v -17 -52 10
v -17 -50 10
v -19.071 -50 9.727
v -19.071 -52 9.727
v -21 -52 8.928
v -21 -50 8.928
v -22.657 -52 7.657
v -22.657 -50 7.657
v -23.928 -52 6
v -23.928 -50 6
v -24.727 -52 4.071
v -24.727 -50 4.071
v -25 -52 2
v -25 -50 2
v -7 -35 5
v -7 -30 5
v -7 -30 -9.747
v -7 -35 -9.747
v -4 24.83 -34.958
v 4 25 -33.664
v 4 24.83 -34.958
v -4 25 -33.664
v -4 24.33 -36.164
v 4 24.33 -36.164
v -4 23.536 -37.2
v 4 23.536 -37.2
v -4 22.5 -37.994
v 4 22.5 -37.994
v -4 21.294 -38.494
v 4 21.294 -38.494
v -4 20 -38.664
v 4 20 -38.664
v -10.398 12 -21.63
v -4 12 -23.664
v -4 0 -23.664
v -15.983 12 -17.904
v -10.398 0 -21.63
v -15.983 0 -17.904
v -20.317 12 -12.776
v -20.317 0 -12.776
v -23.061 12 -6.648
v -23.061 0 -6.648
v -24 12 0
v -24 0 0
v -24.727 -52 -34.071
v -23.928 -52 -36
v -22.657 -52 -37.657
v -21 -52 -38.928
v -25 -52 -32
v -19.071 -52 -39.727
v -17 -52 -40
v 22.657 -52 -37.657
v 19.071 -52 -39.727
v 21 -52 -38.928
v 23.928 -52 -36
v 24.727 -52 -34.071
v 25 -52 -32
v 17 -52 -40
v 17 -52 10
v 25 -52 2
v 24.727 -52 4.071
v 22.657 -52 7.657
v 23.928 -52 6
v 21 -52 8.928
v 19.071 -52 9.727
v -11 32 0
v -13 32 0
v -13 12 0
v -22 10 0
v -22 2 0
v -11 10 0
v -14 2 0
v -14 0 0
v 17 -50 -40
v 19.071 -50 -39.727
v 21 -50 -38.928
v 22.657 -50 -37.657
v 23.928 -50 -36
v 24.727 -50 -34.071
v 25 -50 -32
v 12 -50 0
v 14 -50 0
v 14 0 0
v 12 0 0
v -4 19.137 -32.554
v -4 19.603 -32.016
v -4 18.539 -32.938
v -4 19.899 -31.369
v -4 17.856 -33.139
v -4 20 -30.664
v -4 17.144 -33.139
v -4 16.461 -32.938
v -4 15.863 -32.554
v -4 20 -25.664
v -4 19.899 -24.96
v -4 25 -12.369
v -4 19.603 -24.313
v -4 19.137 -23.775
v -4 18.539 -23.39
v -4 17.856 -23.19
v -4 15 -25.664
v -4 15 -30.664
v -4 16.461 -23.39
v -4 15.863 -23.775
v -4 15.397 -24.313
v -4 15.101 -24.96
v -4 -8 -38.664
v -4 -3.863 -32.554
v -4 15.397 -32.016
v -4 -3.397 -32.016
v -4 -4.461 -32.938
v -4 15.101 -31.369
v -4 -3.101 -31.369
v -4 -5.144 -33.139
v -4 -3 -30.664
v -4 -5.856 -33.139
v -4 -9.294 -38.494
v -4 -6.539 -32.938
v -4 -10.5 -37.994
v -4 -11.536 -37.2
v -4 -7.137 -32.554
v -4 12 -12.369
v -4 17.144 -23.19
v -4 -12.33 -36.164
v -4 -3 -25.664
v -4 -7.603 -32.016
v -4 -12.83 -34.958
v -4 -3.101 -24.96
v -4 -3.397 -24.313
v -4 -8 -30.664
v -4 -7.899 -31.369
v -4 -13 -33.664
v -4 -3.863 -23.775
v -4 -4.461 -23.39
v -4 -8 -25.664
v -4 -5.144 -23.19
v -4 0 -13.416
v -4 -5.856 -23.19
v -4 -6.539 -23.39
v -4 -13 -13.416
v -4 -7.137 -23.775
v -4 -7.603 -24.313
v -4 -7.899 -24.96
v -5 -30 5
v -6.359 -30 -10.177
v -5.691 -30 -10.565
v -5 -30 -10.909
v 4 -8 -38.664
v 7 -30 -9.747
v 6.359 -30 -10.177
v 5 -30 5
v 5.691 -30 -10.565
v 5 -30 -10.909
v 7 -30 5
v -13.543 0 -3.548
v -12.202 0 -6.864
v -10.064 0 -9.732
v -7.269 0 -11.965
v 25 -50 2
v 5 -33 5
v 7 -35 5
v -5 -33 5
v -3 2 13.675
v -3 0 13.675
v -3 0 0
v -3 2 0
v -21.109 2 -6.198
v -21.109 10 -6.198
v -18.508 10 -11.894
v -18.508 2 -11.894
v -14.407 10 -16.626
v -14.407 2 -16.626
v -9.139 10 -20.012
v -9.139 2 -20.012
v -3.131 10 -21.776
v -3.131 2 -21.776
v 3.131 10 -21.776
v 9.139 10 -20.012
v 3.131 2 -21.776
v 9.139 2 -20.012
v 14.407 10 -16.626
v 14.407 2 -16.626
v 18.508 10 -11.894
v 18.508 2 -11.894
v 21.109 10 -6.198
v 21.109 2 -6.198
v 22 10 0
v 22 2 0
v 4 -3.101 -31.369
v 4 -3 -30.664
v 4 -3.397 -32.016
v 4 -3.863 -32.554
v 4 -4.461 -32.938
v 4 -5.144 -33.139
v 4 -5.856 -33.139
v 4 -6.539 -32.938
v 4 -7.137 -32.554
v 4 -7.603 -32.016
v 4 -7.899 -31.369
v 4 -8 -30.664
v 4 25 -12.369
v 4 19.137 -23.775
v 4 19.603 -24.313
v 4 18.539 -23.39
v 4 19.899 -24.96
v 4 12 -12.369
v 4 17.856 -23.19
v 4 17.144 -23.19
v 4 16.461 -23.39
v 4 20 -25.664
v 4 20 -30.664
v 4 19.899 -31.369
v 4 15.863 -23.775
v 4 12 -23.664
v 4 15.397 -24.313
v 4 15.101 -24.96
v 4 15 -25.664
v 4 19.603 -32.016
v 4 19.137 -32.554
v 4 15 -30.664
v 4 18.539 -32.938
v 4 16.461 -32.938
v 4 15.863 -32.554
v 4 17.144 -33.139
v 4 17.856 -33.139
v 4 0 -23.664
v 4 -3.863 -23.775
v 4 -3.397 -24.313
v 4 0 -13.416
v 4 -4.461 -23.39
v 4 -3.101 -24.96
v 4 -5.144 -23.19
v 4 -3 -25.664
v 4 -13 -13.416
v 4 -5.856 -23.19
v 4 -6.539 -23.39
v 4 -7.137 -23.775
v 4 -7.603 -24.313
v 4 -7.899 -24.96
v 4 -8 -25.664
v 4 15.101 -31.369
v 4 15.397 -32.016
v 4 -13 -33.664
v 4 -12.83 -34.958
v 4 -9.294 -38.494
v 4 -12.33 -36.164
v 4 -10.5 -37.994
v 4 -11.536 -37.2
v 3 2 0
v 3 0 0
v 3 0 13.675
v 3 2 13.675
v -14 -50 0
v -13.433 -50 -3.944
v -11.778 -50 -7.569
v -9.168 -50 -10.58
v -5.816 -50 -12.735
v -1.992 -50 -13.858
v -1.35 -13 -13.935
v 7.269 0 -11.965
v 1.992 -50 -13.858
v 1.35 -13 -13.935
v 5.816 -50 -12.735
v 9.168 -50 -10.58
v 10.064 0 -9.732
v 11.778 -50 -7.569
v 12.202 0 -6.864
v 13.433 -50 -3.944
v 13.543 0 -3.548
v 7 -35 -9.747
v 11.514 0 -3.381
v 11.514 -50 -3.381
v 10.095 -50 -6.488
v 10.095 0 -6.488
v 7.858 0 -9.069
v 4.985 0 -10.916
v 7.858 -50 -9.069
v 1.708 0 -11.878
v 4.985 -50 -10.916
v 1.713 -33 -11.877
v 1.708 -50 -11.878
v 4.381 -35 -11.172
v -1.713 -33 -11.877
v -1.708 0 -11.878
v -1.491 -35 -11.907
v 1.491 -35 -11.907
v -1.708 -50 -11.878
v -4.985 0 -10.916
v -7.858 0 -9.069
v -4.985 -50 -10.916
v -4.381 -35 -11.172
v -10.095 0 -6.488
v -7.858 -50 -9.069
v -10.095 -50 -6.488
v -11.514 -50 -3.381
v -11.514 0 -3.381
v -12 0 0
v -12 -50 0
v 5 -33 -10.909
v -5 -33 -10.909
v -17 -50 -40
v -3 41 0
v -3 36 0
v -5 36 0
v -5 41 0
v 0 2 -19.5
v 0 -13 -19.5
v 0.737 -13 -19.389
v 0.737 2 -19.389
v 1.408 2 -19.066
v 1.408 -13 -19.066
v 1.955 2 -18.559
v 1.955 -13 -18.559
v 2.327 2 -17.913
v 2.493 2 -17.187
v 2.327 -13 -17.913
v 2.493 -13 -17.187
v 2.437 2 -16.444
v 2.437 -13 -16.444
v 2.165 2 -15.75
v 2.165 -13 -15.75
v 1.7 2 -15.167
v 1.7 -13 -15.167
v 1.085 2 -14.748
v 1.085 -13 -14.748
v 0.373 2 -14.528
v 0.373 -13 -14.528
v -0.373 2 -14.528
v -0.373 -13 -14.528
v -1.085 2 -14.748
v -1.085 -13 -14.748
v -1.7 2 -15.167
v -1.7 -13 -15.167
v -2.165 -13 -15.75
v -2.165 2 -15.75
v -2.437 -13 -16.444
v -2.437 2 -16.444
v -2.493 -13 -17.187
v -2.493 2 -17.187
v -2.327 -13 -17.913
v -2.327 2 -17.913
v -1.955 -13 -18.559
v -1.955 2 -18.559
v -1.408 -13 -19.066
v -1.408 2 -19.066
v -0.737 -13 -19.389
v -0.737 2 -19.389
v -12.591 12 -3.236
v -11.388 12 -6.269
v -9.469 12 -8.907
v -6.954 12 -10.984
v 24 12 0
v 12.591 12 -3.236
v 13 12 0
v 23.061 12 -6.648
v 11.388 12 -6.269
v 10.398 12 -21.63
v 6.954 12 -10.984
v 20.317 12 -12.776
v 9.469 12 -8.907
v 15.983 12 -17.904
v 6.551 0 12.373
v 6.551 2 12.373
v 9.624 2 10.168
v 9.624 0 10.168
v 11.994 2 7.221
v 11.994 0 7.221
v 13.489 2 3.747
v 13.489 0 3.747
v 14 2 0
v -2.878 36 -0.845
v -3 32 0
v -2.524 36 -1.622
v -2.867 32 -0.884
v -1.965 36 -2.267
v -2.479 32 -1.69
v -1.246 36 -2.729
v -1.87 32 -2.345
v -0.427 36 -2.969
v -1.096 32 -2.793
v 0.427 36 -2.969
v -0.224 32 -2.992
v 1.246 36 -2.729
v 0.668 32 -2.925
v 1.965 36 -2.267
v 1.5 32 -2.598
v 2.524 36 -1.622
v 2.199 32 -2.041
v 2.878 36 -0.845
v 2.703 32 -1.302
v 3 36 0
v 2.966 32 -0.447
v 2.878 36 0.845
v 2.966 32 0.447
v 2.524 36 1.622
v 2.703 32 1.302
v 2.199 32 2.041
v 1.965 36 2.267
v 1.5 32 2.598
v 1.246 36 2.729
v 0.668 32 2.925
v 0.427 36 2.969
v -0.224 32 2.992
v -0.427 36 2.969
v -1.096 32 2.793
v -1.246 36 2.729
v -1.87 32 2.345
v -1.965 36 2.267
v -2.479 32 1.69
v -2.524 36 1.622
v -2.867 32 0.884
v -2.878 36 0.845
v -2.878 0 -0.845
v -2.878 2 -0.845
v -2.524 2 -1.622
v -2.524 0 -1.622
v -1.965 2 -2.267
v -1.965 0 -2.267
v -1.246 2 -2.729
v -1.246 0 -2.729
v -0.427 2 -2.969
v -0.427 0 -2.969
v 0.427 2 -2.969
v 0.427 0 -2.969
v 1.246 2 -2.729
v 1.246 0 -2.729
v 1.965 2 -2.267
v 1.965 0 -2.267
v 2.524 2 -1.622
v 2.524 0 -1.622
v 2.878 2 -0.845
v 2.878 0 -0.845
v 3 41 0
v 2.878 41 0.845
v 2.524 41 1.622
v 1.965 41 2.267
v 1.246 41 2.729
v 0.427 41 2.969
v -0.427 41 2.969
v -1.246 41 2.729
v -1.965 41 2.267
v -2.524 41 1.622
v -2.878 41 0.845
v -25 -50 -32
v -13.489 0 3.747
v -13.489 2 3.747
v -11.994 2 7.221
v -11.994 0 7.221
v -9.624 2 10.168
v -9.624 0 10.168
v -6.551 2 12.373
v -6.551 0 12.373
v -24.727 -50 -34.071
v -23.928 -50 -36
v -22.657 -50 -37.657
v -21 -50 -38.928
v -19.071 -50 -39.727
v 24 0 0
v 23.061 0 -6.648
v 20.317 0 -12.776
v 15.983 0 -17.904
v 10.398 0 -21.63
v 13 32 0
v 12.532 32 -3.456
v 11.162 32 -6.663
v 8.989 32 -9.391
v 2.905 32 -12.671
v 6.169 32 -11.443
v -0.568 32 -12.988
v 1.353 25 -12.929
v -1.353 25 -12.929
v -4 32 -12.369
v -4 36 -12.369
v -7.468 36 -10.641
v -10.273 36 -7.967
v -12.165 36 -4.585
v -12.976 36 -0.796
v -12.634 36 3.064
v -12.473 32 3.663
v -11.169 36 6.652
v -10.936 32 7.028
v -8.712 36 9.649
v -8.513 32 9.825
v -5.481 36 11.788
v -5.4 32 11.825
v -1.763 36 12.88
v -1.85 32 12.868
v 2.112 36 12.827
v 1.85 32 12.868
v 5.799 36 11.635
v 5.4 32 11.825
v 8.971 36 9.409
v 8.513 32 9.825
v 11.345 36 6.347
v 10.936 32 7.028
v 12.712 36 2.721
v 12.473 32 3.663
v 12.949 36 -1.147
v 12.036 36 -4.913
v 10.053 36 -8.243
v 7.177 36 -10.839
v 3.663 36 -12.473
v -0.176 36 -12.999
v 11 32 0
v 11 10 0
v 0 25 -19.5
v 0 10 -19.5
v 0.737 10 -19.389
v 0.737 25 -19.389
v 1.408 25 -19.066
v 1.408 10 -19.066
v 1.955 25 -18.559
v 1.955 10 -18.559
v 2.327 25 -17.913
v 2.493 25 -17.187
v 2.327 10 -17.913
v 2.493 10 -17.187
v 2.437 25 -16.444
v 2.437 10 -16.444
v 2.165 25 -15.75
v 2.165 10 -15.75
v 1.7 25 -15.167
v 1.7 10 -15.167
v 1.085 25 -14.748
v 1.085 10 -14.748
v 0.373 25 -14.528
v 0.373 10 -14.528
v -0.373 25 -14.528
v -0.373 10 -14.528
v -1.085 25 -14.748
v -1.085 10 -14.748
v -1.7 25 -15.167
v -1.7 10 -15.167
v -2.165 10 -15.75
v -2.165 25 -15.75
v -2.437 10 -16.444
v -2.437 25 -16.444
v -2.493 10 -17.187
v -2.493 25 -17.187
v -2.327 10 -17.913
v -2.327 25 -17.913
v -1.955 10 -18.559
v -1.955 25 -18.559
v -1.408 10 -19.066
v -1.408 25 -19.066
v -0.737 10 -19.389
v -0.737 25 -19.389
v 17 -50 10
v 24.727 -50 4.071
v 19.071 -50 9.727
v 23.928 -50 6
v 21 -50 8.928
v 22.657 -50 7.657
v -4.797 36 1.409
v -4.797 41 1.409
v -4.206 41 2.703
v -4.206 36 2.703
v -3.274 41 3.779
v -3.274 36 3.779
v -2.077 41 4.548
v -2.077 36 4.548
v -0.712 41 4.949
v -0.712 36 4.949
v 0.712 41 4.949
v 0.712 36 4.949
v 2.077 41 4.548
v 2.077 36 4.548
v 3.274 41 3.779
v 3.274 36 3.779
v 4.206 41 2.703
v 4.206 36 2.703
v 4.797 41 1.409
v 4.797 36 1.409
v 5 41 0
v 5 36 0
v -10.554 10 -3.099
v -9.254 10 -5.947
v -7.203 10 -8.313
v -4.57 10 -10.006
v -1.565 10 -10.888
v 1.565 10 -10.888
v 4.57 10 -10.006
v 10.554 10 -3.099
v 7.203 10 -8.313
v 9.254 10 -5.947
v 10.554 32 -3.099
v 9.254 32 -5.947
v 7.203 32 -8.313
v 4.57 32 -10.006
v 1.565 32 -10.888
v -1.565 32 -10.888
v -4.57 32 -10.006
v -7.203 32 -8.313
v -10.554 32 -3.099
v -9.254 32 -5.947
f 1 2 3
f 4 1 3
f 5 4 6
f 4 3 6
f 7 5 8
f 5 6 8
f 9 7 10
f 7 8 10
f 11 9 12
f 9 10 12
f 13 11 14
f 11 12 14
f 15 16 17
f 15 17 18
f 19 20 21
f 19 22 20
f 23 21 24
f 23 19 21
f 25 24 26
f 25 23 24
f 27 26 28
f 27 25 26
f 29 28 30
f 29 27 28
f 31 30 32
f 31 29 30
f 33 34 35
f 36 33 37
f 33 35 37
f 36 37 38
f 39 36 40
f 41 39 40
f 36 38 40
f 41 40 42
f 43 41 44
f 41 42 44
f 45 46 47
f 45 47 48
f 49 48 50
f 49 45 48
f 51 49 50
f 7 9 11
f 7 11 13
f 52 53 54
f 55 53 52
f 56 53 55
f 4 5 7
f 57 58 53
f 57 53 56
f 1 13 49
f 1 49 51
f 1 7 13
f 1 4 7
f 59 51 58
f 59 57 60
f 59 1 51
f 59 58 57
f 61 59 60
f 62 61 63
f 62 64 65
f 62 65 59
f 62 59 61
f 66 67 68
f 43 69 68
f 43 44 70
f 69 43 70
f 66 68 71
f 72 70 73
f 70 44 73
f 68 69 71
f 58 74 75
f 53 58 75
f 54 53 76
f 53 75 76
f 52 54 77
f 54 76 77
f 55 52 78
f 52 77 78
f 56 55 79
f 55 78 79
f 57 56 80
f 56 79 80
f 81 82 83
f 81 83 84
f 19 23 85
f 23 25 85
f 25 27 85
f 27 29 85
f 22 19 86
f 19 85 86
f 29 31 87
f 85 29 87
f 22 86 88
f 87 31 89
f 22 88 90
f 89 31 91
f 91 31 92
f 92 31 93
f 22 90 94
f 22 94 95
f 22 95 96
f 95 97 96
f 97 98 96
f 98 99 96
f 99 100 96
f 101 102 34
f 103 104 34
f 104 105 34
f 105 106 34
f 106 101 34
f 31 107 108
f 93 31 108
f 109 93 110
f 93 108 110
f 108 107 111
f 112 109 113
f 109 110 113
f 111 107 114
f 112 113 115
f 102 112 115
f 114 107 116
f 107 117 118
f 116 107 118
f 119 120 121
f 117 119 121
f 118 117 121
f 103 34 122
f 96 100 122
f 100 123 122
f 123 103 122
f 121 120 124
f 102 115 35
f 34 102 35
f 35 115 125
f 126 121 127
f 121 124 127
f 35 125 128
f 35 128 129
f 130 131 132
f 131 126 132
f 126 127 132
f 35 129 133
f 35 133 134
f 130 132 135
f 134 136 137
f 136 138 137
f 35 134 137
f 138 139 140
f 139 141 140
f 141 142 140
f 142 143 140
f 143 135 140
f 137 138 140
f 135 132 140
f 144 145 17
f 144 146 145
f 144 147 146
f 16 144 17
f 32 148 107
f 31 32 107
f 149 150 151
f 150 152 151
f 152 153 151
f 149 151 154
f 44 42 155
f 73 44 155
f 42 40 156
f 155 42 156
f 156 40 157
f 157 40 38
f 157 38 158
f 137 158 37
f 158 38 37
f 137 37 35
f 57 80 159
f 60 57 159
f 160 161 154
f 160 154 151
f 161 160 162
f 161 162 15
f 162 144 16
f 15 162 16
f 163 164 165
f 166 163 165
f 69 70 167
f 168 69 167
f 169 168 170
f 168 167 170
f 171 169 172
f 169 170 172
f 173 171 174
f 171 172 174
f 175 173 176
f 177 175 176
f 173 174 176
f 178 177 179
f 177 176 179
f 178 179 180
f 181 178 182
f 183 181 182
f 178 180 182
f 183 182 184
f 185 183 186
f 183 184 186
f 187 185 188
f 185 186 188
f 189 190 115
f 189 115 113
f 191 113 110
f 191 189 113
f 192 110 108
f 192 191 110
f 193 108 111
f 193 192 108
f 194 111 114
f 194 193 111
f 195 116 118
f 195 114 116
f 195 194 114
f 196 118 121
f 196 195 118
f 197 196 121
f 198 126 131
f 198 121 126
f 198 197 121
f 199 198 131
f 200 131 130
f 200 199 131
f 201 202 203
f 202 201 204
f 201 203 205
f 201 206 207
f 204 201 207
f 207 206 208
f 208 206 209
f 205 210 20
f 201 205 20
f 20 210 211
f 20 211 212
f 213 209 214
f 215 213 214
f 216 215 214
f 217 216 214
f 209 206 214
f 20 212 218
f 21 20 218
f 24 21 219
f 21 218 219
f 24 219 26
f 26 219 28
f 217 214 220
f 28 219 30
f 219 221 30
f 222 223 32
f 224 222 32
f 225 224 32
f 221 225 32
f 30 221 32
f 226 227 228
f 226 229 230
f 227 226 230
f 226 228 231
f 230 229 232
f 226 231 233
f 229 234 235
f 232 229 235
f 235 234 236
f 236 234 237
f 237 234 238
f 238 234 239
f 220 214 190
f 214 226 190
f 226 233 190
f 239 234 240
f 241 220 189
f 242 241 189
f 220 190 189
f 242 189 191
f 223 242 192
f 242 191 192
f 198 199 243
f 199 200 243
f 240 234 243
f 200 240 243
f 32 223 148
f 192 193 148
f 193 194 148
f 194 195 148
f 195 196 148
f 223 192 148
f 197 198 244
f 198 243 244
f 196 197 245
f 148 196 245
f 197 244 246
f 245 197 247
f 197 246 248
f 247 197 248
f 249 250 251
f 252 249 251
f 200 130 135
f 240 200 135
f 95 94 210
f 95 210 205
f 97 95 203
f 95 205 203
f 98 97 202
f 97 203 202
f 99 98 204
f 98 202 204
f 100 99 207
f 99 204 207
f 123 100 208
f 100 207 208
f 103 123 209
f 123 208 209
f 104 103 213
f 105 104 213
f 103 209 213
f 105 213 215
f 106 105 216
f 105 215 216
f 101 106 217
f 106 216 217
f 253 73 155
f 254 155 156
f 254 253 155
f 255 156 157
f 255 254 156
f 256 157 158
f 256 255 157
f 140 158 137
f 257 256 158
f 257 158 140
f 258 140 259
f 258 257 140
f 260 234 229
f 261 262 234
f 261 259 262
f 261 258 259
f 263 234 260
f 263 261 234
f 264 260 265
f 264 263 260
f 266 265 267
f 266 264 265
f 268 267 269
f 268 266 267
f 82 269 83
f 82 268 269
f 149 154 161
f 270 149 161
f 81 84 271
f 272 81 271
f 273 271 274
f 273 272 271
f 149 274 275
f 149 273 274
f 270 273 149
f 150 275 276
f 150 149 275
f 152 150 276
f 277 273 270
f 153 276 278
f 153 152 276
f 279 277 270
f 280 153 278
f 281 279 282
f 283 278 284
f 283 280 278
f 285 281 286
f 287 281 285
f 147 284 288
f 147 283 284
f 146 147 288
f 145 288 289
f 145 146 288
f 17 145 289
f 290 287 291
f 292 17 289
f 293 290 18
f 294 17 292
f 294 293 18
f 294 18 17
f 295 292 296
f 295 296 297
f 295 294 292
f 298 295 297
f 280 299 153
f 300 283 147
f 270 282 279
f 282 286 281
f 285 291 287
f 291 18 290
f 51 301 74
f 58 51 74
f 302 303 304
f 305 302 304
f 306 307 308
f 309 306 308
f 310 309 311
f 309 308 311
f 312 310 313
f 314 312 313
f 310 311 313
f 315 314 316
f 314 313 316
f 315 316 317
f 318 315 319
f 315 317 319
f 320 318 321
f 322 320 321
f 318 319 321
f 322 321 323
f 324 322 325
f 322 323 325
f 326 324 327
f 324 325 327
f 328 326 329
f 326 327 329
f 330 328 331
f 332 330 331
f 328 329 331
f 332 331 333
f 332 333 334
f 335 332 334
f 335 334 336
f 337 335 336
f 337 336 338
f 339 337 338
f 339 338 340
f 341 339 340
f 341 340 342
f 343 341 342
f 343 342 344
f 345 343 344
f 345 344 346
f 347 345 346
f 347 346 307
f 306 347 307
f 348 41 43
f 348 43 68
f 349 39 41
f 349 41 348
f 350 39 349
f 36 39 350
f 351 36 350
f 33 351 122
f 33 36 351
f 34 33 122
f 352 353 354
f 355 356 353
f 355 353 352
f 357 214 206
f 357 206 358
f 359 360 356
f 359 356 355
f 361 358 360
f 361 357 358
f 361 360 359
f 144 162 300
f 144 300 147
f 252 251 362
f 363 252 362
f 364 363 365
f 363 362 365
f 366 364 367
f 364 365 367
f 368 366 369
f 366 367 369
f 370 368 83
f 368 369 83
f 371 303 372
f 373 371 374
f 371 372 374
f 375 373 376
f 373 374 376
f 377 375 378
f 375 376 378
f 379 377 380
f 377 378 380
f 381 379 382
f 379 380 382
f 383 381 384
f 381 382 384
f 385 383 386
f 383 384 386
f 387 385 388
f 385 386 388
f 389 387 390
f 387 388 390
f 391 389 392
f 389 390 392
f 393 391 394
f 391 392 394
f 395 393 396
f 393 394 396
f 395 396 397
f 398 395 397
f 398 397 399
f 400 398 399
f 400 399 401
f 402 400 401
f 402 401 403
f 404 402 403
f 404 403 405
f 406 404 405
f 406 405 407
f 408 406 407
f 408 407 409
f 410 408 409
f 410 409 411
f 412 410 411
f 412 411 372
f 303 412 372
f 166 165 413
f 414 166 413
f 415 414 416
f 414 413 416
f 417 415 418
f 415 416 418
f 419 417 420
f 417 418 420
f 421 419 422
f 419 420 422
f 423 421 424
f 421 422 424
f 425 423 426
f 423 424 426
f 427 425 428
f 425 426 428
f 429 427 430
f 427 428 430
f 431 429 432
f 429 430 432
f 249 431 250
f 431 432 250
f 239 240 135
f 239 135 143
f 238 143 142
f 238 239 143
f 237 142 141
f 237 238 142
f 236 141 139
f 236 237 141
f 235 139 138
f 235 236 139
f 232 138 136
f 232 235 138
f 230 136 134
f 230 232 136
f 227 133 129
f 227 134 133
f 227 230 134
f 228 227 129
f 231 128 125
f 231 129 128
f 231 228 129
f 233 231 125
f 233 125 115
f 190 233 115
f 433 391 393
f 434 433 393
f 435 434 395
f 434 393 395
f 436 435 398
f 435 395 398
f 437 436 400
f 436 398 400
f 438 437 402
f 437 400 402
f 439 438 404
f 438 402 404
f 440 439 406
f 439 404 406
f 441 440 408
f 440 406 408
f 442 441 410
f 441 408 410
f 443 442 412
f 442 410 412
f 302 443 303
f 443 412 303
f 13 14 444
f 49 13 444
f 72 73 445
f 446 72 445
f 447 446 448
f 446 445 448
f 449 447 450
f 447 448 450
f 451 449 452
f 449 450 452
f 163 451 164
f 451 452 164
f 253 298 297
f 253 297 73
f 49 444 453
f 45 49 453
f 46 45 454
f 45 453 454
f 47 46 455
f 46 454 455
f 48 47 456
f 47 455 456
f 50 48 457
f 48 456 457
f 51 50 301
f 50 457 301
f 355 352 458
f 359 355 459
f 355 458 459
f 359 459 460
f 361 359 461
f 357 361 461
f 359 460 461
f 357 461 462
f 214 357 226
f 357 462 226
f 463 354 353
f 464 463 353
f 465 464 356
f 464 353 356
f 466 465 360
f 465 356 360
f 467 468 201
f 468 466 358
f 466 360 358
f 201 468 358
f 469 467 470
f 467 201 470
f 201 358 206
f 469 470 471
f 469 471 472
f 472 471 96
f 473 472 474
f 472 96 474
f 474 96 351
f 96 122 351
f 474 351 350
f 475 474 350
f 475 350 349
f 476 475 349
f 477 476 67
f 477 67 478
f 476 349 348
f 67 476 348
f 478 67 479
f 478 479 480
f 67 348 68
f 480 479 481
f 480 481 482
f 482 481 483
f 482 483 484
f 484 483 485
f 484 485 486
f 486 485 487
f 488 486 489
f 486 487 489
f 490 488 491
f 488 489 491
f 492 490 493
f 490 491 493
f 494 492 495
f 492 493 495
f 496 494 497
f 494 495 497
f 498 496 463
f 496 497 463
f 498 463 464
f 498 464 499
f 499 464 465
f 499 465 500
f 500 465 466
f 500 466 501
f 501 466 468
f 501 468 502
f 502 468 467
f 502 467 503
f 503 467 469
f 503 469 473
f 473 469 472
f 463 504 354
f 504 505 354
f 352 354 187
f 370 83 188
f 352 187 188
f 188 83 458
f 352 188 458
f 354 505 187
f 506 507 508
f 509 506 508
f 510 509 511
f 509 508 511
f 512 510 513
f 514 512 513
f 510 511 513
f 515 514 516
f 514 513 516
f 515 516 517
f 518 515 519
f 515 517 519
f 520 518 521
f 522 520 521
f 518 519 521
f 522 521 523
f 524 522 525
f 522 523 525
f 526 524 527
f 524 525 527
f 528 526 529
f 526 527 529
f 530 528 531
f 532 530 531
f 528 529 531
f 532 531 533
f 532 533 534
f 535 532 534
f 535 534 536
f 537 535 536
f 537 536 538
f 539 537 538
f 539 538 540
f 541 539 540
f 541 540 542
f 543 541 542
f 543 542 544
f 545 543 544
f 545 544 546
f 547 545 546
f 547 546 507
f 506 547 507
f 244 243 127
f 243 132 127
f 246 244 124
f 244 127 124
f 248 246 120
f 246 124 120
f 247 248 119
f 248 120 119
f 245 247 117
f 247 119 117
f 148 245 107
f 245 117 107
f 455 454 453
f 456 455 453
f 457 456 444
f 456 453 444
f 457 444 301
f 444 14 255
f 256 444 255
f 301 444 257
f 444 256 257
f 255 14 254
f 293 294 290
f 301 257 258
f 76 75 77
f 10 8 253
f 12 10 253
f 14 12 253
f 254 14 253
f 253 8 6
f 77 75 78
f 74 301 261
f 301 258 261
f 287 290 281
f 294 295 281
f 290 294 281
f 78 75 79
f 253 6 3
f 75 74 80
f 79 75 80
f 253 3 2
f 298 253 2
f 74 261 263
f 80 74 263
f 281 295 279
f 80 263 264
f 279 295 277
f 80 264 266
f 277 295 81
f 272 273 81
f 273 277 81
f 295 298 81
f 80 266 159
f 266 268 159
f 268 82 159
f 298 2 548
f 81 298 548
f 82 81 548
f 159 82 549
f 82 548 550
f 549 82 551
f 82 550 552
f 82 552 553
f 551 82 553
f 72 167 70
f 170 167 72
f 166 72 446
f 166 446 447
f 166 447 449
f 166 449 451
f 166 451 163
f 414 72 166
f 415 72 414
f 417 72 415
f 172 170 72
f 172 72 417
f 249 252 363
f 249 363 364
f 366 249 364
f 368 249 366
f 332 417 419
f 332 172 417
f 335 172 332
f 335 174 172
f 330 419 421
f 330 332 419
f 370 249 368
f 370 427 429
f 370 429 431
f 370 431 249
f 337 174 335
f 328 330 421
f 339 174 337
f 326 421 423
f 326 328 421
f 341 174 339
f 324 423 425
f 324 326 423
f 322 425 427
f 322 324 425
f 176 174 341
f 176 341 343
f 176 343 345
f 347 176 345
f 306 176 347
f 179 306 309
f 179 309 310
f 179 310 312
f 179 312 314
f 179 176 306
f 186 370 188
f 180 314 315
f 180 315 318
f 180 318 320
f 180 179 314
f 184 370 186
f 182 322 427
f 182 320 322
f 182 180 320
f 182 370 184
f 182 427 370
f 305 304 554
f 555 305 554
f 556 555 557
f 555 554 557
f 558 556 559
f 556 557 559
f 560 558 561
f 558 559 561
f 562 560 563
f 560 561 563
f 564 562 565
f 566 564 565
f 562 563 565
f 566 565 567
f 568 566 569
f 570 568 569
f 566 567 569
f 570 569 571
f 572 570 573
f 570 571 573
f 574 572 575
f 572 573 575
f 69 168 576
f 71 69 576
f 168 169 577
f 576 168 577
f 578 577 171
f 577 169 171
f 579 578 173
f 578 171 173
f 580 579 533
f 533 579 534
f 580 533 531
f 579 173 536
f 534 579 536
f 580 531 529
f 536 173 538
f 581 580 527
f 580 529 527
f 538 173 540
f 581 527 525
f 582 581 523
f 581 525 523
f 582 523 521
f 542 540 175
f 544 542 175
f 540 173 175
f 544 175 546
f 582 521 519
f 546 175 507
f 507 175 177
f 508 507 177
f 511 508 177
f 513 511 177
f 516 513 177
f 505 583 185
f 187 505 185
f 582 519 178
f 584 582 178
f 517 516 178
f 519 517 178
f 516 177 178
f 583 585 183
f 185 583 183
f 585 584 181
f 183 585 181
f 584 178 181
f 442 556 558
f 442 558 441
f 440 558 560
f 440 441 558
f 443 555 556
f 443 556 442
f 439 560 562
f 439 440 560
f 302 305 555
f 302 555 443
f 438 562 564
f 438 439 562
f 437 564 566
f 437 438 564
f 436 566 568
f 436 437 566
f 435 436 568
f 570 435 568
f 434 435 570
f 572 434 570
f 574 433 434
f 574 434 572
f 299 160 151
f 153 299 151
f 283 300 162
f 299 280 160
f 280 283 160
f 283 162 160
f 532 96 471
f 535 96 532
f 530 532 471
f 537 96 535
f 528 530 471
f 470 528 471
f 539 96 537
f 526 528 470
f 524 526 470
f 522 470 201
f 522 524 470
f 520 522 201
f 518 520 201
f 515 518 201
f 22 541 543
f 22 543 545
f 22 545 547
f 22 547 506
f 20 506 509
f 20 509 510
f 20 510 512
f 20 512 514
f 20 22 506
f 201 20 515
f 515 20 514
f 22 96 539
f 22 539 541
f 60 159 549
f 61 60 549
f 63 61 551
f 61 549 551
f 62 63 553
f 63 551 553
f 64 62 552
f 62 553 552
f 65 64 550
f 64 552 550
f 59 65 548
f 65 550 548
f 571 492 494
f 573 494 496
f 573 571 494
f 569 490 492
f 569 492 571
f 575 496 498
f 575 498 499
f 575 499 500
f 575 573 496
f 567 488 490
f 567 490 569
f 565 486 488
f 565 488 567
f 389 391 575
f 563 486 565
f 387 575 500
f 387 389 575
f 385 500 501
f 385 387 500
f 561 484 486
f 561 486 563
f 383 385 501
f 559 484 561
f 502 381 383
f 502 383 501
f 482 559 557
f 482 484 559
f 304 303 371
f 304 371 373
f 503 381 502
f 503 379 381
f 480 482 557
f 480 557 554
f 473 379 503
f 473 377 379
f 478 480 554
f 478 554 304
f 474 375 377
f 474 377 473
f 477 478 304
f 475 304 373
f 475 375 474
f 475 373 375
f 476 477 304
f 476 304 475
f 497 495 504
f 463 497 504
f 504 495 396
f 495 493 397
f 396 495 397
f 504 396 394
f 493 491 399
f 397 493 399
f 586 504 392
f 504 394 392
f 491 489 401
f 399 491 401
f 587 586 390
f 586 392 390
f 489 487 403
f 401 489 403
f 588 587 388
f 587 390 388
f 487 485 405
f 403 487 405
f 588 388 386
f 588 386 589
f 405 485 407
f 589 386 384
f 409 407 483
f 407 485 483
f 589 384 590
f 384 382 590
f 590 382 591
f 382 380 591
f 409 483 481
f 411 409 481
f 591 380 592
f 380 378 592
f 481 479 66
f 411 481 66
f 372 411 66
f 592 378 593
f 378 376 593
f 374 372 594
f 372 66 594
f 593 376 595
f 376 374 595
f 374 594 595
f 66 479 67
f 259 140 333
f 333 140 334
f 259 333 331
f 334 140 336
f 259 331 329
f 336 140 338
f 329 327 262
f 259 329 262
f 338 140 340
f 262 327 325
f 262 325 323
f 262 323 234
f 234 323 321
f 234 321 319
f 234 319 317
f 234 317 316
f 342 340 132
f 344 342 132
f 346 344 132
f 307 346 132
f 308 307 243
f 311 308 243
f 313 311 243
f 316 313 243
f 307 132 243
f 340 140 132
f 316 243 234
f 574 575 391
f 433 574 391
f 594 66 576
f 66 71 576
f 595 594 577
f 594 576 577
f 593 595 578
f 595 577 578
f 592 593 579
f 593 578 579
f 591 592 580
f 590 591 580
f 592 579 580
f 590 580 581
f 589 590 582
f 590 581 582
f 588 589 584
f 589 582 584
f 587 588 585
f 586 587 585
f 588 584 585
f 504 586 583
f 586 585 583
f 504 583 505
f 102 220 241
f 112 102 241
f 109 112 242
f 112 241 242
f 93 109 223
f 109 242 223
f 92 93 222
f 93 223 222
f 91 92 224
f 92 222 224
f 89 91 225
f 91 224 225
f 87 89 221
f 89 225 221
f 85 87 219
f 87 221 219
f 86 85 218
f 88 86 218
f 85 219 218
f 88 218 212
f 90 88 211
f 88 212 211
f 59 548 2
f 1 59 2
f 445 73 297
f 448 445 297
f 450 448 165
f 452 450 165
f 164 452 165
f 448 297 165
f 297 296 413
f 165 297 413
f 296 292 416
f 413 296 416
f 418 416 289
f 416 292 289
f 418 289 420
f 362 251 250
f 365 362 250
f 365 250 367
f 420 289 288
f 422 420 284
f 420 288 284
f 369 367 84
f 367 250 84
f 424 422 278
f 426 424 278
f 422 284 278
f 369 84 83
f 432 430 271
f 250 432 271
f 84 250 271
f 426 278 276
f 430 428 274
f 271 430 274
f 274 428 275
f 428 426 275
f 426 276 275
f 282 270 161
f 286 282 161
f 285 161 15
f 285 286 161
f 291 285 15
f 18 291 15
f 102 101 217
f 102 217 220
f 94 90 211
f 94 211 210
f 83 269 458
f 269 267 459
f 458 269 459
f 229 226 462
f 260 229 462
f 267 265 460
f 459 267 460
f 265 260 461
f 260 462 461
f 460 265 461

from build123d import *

# Parameters (mm, degrees)
MOTOR_FRONTPLATE_DEPTH           = 2
MOTORKRYBBE_START                = 50
MOTORKRYBBE_DEPTH                = 50
SKYGGE_KAPPE_DEPTH               = 8
SKYGGE_TOPP_DEPTH                = 2
LEDHOLDER_TOPP_DEPTH             = 13
LEDHOLDER_START                  = 13
LEDHOLDER_BUNN_DEPTH             = 13
SKETCH10_R                       = 2.5
LEDHULL_DEPTH                    = 51.950956811
ROTORKAPPE_VEGG_DEPTH            = 20
SKETCH12_R                       = 13
LASERHOLDER_DEPTH                = 4
LASER_HULL_D                     = 6
BUNNPLATE_DEPTH                  = 2
BOSS_EXTRUDE12_DEPTH             = 5
BOSS_EXTRUDE12_DIRECTION_2_REACH = 72.207
LED_START                        = -38
LED_KABELHOLDER_DEPTH            = 38
KABELHOLDER_HULL_REACH           = 73.729
FILLET1_R                        = 5
BOSS_EXTRUDE14_DEPTH             = 5


with BuildPart() as part:
    # Sketch1 → Motor-frontplate (new body)
    with BuildSketch(Plane(origin=(0, 0, 0), x_dir=(1, 0, 0), z_dir=(0, 1, 0))):
        with BuildLine():
            ThreePointArc((-3, 0), (0, 3), (3, 0))
            Line((3, 0), (3, -13.674794331))
            ThreePointArc((3, -13.674794331), (10.908712115, -8.774964387), (14, 0))
            ThreePointArc((14, 0), (0, 14), (-14, 0))
            ThreePointArc((-14, 0), (-10.908712115, -8.774964387), (-3, -13.674794331))
            Line((-3, -13.674794331), (-3, 0))
        make_face()
        with BuildLine():
            Line((14, 0), (24, 0))
            ThreePointArc((24, 0), (0, 24), (-24, 0))
            Line((-24, 0), (-14, 0))
            ThreePointArc((-14, 0), (0, 14), (14, 0))
        make_face()
    extrude(amount=MOTOR_FRONTPLATE_DEPTH)

    # Sketch2 → Motorkrybbe (add)
    with BuildSketch(Plane.XZ.offset(MOTORKRYBBE_START)):
        with BuildLine():
            Line((-12, 0), (-14, 0))
            ThreePointArc((-14, 0), (0, -14), (14, 0))
            Line((14, 0), (12, 0))
            ThreePointArc((12, 0), (0, -12), (-12, 0))
        make_face()
    extrude(amount=-MOTORKRYBBE_DEPTH)

    # Sketch5 → Skygge - Kappe (add)
    with BuildSketch(Plane(origin=(0, 2, 0), x_dir=(1, 0, 0), z_dir=(0, 1, 0))):
        with BuildLine():
            Line((-24, 0), (-22, 0))
            ThreePointArc((-22, 0), (0, 22), (22, 0))
            Line((22, 0), (24, 0))
            ThreePointArc((24, 0), (0, 24), (-24, 0))
        make_face()
    extrude(amount=SKYGGE_KAPPE_DEPTH)

    # Sketch6 → Skygge - Topp (add)
    with BuildSketch(Plane(origin=(0, 10, 0), x_dir=(1, 0, 0), z_dir=(0, 1, 0))):
        with BuildLine():
            Line((-24, 0), (-11, 0))
            ThreePointArc((-11, 0), (0, 11), (11, 0))
            Line((11, 0), (24, 0))
            ThreePointArc((24, 0), (0, 24), (-24, 0))
        make_face()
    extrude(amount=SKYGGE_TOPP_DEPTH)

    # Sketch7 → LEDholder - Topp (add)
    with BuildSketch(Plane(origin=(0, 12, 0), x_dir=(1, 0, 0), z_dir=(0, 1, 0))):
        with BuildLine():
            Line((-4, 12.369316877), (-4, 23.664319132))
            ThreePointArc((-4, 23.664319132), (0, 24), (4, 23.664319132))
            Line((4, 23.664319132), (4, 12.369316877))
            ThreePointArc((4, 12.369316877), (0, 13), (-4, 12.369316877))
        make_face()
    extrude(amount=LEDHOLDER_TOPP_DEPTH)

    # Sketch8 → LEDholder - Bunn (add)
    with BuildSketch(Plane.XZ.offset(LEDHOLDER_START)):
        with BuildLine():
            ThreePointArc((-4, -23.664319132), (0, -24), (4, -23.664319132))
            Line((4, -23.664319132), (4, -13.416407865))
            ThreePointArc((4, -13.416407865), (0, -14), (-4, -13.416407865))
            Line((-4, -13.416407865), (-4, -23.664319132))
        make_face()
    extrude(amount=-LEDHOLDER_BUNN_DEPTH)

    # Sketch10 → LEDhull (cut, through all)
    with BuildSketch(Plane.XZ.offset(13)):
        with Locations(Location((0, -17, 0), (0, 0, 270))):
            Circle(SKETCH10_R)
    extrude(amount=-LEDHULL_DEPTH, mode=Mode.SUBTRACT)

    # Sketch11 → Rotorkappe - Vegg (add)
    with BuildSketch(Plane(origin=(0, 12, 0), x_dir=(1, 0, 0), z_dir=(0, 1, 0))):
        with BuildLine():
            Line((-13, 0), (-11, 0))
            ThreePointArc((-11, 0), (0, 11), (11, 0))
            Line((11, 0), (13, 0))
            ThreePointArc((13, 0), (0, 13), (-13, 0))
        make_face()
    extrude(amount=ROTORKAPPE_VEGG_DEPTH)

    # Sketch12 → Laserholder (add)
    with BuildSketch(Plane(origin=(0, 32, 0), x_dir=(1, 0, 0), z_dir=(0, 1, 0))):
        with Locations(Location((0, 0, 0), (0, 0, 107.920213139))):
            Circle(SKETCH12_R)
    extrude(amount=LASERHOLDER_DEPTH)

    # Laser - hull (through all)
    with Locations(Plane(origin=(0, 36, 0), x_dir=(1, 0, 0), z_dir=(0, 1, 0))):
        with Locations((0, 0)):
            Hole(LASER_HULL_D / 2)

    # Sketch16 → Bunnplate (add)
    with BuildSketch(Plane.XZ.offset(50)):
        with BuildLine():
            Line((-17, -40), (17, -40))
            ThreePointArc((17, -40), (22.656854249, -37.656854249), (25, -32))
            Line((25, -32), (25, 2))
            ThreePointArc((25, 2), (22.656854249, 7.656854249), (17, 10))
            Line((17, 10), (-17, 10))
            ThreePointArc((-17, 10), (-22.656854249, 7.656854249), (-25, 2))
            Line((-25, 2), (-25, -32))
            ThreePointArc((-25, -32), (-22.656854249, -37.656854249), (-17, -40))
        make_face()
    extrude(amount=BUNNPLATE_DEPTH)

    # Sketch19 → Boss-Extrude12 (add)
    with BuildSketch(Plane.XY):
        Polygon((0, -33), (-5, -33), (-5, -30), (-7, -30), (-7, -35), (0, -35), align=None)
    boss_extrude12 = extrude(amount=BOSS_EXTRUDE12_DEPTH)

    # Sketch19 → Boss-Extrude12 direction 2 (add, up to next)
    with BuildSketch(Plane.XY, mode=Mode.PRIVATE) as boss_extrude12_direction_2_sk1:
        Polygon((0, -33), (-5, -33), (-5, -30), (-7, -30), (-7, -35), (0, -35), align=None)
    boss_extrude12_direction_2_tool1 = extrude(boss_extrude12_direction_2_sk1.sketch, amount=-BOSS_EXTRUDE12_DIRECTION_2_REACH, mode=Mode.PRIVATE) - part.part
    boss_extrude12_direction_2 = boss_extrude12_direction_2_tool1.solids().sort_by_distance((-4.25, -33.25, 0))[0]
    add(boss_extrude12_direction_2)

    # Mirror2: Boss-Extrude12, Boss-Extrude12 direction 2 across plane
    add(boss_extrude12.mirror(Plane(origin=(0, -35, -40.002), x_dir=(0, 0, 1), z_dir=(1, 0, 0))))
    add(boss_extrude12_direction_2.mirror(Plane(origin=(0, -35, -40.002), x_dir=(0, 0, 1), z_dir=(1, 0, 0))))

    # Sketch20 → LED - kabelholder (add)
    with BuildSketch(Plane(origin=(0, 25, 0), x_dir=(1, 0, 0), z_dir=(0, 1, 0)).offset(LED_START)):
        with BuildLine():
            Line((4, 23.664319132), (4, 38.664319132))
            Line((4, 38.664319132), (-4, 38.664319132))
            Line((-4, 38.664319132), (-4, 23.664319132))
            ThreePointArc((-4, 23.664319132), (0, 24), (4, 23.664319132))
        make_face()
    extrude(amount=LED_KABELHOLDER_DEPTH)

    # Sketch21 → Kabelholder - hull (cut, up to next)
    with BuildSketch(Plane(origin=(4, 0, 0), x_dir=(0, 0, -1), z_dir=(1, 0, 0)), mode=Mode.PRIVATE) as kabelholder_hull_sk1:
        with BuildLine():
            Line((25.664319132, 15), (30.664319132, 15))
            ThreePointArc((30.664319132, 15), (33.164319132, 17.5), (30.664319132, 20))
            Line((30.664319132, 20), (25.664319132, 20))
            ThreePointArc((25.664319132, 20), (23.164319132, 17.5), (25.664319132, 15))
        make_face()
    kabelholder_hull_tool1 = extrude(kabelholder_hull_sk1.sketch, amount=-KABELHOLDER_HULL_REACH, mode=Mode.PRIVATE) & part.part
    # Sketch21 → Kabelholder - hull (cut, up to next)
    with BuildSketch(Plane(origin=(4, 0, 0), x_dir=(0, 0, -1), z_dir=(1, 0, 0)), mode=Mode.PRIVATE) as kabelholder_hull_sk2:
        with BuildLine():
            ThreePointArc((30.664319132, -3), (33.164319132, -5.5), (30.664319132, -8))
            Line((30.664319132, -8), (25.664319132, -8))
            ThreePointArc((25.664319132, -8), (23.164319132, -5.5), (25.664319132, -3))
            Line((25.664319132, -3), (30.664319132, -3))
        make_face()
    kabelholder_hull_tool2 = extrude(kabelholder_hull_sk2.sketch, amount=-KABELHOLDER_HULL_REACH, mode=Mode.PRIVATE) & part.part
    add(kabelholder_hull_tool1.solids().sort_by_distance((4, 17.5, -28.164319))[0], mode=Mode.SUBTRACT)
    add(kabelholder_hull_tool2.solids().sort_by_distance((4, -5.5, -28.164319))[0], mode=Mode.SUBTRACT)

    # Fillet1
    fillet1_edges = [part.edges().sort_by_distance(p)[0] for p in [
        (0, -13, -38.664319132),
        (0, 25, -38.664319132),
    ]]
    fillet(fillet1_edges, radius=FILLET1_R)

    # Sketch22 → Boss-Extrude14 (add)
    with BuildSketch(Plane(origin=(0, 36, 0), x_dir=(1, 0, 0), z_dir=(0, 1, 0))):
        with BuildLine():
            Line((-3, 0), (-5, 0))
            ThreePointArc((-5, 0), (0, -5), (5, 0))
            Line((5, 0), (3, 0))
            ThreePointArc((3, 0), (0, -3), (-3, 0))
        make_face()
    extrude(amount=BOSS_EXTRUDE14_DEPTH)


solid = part.part
